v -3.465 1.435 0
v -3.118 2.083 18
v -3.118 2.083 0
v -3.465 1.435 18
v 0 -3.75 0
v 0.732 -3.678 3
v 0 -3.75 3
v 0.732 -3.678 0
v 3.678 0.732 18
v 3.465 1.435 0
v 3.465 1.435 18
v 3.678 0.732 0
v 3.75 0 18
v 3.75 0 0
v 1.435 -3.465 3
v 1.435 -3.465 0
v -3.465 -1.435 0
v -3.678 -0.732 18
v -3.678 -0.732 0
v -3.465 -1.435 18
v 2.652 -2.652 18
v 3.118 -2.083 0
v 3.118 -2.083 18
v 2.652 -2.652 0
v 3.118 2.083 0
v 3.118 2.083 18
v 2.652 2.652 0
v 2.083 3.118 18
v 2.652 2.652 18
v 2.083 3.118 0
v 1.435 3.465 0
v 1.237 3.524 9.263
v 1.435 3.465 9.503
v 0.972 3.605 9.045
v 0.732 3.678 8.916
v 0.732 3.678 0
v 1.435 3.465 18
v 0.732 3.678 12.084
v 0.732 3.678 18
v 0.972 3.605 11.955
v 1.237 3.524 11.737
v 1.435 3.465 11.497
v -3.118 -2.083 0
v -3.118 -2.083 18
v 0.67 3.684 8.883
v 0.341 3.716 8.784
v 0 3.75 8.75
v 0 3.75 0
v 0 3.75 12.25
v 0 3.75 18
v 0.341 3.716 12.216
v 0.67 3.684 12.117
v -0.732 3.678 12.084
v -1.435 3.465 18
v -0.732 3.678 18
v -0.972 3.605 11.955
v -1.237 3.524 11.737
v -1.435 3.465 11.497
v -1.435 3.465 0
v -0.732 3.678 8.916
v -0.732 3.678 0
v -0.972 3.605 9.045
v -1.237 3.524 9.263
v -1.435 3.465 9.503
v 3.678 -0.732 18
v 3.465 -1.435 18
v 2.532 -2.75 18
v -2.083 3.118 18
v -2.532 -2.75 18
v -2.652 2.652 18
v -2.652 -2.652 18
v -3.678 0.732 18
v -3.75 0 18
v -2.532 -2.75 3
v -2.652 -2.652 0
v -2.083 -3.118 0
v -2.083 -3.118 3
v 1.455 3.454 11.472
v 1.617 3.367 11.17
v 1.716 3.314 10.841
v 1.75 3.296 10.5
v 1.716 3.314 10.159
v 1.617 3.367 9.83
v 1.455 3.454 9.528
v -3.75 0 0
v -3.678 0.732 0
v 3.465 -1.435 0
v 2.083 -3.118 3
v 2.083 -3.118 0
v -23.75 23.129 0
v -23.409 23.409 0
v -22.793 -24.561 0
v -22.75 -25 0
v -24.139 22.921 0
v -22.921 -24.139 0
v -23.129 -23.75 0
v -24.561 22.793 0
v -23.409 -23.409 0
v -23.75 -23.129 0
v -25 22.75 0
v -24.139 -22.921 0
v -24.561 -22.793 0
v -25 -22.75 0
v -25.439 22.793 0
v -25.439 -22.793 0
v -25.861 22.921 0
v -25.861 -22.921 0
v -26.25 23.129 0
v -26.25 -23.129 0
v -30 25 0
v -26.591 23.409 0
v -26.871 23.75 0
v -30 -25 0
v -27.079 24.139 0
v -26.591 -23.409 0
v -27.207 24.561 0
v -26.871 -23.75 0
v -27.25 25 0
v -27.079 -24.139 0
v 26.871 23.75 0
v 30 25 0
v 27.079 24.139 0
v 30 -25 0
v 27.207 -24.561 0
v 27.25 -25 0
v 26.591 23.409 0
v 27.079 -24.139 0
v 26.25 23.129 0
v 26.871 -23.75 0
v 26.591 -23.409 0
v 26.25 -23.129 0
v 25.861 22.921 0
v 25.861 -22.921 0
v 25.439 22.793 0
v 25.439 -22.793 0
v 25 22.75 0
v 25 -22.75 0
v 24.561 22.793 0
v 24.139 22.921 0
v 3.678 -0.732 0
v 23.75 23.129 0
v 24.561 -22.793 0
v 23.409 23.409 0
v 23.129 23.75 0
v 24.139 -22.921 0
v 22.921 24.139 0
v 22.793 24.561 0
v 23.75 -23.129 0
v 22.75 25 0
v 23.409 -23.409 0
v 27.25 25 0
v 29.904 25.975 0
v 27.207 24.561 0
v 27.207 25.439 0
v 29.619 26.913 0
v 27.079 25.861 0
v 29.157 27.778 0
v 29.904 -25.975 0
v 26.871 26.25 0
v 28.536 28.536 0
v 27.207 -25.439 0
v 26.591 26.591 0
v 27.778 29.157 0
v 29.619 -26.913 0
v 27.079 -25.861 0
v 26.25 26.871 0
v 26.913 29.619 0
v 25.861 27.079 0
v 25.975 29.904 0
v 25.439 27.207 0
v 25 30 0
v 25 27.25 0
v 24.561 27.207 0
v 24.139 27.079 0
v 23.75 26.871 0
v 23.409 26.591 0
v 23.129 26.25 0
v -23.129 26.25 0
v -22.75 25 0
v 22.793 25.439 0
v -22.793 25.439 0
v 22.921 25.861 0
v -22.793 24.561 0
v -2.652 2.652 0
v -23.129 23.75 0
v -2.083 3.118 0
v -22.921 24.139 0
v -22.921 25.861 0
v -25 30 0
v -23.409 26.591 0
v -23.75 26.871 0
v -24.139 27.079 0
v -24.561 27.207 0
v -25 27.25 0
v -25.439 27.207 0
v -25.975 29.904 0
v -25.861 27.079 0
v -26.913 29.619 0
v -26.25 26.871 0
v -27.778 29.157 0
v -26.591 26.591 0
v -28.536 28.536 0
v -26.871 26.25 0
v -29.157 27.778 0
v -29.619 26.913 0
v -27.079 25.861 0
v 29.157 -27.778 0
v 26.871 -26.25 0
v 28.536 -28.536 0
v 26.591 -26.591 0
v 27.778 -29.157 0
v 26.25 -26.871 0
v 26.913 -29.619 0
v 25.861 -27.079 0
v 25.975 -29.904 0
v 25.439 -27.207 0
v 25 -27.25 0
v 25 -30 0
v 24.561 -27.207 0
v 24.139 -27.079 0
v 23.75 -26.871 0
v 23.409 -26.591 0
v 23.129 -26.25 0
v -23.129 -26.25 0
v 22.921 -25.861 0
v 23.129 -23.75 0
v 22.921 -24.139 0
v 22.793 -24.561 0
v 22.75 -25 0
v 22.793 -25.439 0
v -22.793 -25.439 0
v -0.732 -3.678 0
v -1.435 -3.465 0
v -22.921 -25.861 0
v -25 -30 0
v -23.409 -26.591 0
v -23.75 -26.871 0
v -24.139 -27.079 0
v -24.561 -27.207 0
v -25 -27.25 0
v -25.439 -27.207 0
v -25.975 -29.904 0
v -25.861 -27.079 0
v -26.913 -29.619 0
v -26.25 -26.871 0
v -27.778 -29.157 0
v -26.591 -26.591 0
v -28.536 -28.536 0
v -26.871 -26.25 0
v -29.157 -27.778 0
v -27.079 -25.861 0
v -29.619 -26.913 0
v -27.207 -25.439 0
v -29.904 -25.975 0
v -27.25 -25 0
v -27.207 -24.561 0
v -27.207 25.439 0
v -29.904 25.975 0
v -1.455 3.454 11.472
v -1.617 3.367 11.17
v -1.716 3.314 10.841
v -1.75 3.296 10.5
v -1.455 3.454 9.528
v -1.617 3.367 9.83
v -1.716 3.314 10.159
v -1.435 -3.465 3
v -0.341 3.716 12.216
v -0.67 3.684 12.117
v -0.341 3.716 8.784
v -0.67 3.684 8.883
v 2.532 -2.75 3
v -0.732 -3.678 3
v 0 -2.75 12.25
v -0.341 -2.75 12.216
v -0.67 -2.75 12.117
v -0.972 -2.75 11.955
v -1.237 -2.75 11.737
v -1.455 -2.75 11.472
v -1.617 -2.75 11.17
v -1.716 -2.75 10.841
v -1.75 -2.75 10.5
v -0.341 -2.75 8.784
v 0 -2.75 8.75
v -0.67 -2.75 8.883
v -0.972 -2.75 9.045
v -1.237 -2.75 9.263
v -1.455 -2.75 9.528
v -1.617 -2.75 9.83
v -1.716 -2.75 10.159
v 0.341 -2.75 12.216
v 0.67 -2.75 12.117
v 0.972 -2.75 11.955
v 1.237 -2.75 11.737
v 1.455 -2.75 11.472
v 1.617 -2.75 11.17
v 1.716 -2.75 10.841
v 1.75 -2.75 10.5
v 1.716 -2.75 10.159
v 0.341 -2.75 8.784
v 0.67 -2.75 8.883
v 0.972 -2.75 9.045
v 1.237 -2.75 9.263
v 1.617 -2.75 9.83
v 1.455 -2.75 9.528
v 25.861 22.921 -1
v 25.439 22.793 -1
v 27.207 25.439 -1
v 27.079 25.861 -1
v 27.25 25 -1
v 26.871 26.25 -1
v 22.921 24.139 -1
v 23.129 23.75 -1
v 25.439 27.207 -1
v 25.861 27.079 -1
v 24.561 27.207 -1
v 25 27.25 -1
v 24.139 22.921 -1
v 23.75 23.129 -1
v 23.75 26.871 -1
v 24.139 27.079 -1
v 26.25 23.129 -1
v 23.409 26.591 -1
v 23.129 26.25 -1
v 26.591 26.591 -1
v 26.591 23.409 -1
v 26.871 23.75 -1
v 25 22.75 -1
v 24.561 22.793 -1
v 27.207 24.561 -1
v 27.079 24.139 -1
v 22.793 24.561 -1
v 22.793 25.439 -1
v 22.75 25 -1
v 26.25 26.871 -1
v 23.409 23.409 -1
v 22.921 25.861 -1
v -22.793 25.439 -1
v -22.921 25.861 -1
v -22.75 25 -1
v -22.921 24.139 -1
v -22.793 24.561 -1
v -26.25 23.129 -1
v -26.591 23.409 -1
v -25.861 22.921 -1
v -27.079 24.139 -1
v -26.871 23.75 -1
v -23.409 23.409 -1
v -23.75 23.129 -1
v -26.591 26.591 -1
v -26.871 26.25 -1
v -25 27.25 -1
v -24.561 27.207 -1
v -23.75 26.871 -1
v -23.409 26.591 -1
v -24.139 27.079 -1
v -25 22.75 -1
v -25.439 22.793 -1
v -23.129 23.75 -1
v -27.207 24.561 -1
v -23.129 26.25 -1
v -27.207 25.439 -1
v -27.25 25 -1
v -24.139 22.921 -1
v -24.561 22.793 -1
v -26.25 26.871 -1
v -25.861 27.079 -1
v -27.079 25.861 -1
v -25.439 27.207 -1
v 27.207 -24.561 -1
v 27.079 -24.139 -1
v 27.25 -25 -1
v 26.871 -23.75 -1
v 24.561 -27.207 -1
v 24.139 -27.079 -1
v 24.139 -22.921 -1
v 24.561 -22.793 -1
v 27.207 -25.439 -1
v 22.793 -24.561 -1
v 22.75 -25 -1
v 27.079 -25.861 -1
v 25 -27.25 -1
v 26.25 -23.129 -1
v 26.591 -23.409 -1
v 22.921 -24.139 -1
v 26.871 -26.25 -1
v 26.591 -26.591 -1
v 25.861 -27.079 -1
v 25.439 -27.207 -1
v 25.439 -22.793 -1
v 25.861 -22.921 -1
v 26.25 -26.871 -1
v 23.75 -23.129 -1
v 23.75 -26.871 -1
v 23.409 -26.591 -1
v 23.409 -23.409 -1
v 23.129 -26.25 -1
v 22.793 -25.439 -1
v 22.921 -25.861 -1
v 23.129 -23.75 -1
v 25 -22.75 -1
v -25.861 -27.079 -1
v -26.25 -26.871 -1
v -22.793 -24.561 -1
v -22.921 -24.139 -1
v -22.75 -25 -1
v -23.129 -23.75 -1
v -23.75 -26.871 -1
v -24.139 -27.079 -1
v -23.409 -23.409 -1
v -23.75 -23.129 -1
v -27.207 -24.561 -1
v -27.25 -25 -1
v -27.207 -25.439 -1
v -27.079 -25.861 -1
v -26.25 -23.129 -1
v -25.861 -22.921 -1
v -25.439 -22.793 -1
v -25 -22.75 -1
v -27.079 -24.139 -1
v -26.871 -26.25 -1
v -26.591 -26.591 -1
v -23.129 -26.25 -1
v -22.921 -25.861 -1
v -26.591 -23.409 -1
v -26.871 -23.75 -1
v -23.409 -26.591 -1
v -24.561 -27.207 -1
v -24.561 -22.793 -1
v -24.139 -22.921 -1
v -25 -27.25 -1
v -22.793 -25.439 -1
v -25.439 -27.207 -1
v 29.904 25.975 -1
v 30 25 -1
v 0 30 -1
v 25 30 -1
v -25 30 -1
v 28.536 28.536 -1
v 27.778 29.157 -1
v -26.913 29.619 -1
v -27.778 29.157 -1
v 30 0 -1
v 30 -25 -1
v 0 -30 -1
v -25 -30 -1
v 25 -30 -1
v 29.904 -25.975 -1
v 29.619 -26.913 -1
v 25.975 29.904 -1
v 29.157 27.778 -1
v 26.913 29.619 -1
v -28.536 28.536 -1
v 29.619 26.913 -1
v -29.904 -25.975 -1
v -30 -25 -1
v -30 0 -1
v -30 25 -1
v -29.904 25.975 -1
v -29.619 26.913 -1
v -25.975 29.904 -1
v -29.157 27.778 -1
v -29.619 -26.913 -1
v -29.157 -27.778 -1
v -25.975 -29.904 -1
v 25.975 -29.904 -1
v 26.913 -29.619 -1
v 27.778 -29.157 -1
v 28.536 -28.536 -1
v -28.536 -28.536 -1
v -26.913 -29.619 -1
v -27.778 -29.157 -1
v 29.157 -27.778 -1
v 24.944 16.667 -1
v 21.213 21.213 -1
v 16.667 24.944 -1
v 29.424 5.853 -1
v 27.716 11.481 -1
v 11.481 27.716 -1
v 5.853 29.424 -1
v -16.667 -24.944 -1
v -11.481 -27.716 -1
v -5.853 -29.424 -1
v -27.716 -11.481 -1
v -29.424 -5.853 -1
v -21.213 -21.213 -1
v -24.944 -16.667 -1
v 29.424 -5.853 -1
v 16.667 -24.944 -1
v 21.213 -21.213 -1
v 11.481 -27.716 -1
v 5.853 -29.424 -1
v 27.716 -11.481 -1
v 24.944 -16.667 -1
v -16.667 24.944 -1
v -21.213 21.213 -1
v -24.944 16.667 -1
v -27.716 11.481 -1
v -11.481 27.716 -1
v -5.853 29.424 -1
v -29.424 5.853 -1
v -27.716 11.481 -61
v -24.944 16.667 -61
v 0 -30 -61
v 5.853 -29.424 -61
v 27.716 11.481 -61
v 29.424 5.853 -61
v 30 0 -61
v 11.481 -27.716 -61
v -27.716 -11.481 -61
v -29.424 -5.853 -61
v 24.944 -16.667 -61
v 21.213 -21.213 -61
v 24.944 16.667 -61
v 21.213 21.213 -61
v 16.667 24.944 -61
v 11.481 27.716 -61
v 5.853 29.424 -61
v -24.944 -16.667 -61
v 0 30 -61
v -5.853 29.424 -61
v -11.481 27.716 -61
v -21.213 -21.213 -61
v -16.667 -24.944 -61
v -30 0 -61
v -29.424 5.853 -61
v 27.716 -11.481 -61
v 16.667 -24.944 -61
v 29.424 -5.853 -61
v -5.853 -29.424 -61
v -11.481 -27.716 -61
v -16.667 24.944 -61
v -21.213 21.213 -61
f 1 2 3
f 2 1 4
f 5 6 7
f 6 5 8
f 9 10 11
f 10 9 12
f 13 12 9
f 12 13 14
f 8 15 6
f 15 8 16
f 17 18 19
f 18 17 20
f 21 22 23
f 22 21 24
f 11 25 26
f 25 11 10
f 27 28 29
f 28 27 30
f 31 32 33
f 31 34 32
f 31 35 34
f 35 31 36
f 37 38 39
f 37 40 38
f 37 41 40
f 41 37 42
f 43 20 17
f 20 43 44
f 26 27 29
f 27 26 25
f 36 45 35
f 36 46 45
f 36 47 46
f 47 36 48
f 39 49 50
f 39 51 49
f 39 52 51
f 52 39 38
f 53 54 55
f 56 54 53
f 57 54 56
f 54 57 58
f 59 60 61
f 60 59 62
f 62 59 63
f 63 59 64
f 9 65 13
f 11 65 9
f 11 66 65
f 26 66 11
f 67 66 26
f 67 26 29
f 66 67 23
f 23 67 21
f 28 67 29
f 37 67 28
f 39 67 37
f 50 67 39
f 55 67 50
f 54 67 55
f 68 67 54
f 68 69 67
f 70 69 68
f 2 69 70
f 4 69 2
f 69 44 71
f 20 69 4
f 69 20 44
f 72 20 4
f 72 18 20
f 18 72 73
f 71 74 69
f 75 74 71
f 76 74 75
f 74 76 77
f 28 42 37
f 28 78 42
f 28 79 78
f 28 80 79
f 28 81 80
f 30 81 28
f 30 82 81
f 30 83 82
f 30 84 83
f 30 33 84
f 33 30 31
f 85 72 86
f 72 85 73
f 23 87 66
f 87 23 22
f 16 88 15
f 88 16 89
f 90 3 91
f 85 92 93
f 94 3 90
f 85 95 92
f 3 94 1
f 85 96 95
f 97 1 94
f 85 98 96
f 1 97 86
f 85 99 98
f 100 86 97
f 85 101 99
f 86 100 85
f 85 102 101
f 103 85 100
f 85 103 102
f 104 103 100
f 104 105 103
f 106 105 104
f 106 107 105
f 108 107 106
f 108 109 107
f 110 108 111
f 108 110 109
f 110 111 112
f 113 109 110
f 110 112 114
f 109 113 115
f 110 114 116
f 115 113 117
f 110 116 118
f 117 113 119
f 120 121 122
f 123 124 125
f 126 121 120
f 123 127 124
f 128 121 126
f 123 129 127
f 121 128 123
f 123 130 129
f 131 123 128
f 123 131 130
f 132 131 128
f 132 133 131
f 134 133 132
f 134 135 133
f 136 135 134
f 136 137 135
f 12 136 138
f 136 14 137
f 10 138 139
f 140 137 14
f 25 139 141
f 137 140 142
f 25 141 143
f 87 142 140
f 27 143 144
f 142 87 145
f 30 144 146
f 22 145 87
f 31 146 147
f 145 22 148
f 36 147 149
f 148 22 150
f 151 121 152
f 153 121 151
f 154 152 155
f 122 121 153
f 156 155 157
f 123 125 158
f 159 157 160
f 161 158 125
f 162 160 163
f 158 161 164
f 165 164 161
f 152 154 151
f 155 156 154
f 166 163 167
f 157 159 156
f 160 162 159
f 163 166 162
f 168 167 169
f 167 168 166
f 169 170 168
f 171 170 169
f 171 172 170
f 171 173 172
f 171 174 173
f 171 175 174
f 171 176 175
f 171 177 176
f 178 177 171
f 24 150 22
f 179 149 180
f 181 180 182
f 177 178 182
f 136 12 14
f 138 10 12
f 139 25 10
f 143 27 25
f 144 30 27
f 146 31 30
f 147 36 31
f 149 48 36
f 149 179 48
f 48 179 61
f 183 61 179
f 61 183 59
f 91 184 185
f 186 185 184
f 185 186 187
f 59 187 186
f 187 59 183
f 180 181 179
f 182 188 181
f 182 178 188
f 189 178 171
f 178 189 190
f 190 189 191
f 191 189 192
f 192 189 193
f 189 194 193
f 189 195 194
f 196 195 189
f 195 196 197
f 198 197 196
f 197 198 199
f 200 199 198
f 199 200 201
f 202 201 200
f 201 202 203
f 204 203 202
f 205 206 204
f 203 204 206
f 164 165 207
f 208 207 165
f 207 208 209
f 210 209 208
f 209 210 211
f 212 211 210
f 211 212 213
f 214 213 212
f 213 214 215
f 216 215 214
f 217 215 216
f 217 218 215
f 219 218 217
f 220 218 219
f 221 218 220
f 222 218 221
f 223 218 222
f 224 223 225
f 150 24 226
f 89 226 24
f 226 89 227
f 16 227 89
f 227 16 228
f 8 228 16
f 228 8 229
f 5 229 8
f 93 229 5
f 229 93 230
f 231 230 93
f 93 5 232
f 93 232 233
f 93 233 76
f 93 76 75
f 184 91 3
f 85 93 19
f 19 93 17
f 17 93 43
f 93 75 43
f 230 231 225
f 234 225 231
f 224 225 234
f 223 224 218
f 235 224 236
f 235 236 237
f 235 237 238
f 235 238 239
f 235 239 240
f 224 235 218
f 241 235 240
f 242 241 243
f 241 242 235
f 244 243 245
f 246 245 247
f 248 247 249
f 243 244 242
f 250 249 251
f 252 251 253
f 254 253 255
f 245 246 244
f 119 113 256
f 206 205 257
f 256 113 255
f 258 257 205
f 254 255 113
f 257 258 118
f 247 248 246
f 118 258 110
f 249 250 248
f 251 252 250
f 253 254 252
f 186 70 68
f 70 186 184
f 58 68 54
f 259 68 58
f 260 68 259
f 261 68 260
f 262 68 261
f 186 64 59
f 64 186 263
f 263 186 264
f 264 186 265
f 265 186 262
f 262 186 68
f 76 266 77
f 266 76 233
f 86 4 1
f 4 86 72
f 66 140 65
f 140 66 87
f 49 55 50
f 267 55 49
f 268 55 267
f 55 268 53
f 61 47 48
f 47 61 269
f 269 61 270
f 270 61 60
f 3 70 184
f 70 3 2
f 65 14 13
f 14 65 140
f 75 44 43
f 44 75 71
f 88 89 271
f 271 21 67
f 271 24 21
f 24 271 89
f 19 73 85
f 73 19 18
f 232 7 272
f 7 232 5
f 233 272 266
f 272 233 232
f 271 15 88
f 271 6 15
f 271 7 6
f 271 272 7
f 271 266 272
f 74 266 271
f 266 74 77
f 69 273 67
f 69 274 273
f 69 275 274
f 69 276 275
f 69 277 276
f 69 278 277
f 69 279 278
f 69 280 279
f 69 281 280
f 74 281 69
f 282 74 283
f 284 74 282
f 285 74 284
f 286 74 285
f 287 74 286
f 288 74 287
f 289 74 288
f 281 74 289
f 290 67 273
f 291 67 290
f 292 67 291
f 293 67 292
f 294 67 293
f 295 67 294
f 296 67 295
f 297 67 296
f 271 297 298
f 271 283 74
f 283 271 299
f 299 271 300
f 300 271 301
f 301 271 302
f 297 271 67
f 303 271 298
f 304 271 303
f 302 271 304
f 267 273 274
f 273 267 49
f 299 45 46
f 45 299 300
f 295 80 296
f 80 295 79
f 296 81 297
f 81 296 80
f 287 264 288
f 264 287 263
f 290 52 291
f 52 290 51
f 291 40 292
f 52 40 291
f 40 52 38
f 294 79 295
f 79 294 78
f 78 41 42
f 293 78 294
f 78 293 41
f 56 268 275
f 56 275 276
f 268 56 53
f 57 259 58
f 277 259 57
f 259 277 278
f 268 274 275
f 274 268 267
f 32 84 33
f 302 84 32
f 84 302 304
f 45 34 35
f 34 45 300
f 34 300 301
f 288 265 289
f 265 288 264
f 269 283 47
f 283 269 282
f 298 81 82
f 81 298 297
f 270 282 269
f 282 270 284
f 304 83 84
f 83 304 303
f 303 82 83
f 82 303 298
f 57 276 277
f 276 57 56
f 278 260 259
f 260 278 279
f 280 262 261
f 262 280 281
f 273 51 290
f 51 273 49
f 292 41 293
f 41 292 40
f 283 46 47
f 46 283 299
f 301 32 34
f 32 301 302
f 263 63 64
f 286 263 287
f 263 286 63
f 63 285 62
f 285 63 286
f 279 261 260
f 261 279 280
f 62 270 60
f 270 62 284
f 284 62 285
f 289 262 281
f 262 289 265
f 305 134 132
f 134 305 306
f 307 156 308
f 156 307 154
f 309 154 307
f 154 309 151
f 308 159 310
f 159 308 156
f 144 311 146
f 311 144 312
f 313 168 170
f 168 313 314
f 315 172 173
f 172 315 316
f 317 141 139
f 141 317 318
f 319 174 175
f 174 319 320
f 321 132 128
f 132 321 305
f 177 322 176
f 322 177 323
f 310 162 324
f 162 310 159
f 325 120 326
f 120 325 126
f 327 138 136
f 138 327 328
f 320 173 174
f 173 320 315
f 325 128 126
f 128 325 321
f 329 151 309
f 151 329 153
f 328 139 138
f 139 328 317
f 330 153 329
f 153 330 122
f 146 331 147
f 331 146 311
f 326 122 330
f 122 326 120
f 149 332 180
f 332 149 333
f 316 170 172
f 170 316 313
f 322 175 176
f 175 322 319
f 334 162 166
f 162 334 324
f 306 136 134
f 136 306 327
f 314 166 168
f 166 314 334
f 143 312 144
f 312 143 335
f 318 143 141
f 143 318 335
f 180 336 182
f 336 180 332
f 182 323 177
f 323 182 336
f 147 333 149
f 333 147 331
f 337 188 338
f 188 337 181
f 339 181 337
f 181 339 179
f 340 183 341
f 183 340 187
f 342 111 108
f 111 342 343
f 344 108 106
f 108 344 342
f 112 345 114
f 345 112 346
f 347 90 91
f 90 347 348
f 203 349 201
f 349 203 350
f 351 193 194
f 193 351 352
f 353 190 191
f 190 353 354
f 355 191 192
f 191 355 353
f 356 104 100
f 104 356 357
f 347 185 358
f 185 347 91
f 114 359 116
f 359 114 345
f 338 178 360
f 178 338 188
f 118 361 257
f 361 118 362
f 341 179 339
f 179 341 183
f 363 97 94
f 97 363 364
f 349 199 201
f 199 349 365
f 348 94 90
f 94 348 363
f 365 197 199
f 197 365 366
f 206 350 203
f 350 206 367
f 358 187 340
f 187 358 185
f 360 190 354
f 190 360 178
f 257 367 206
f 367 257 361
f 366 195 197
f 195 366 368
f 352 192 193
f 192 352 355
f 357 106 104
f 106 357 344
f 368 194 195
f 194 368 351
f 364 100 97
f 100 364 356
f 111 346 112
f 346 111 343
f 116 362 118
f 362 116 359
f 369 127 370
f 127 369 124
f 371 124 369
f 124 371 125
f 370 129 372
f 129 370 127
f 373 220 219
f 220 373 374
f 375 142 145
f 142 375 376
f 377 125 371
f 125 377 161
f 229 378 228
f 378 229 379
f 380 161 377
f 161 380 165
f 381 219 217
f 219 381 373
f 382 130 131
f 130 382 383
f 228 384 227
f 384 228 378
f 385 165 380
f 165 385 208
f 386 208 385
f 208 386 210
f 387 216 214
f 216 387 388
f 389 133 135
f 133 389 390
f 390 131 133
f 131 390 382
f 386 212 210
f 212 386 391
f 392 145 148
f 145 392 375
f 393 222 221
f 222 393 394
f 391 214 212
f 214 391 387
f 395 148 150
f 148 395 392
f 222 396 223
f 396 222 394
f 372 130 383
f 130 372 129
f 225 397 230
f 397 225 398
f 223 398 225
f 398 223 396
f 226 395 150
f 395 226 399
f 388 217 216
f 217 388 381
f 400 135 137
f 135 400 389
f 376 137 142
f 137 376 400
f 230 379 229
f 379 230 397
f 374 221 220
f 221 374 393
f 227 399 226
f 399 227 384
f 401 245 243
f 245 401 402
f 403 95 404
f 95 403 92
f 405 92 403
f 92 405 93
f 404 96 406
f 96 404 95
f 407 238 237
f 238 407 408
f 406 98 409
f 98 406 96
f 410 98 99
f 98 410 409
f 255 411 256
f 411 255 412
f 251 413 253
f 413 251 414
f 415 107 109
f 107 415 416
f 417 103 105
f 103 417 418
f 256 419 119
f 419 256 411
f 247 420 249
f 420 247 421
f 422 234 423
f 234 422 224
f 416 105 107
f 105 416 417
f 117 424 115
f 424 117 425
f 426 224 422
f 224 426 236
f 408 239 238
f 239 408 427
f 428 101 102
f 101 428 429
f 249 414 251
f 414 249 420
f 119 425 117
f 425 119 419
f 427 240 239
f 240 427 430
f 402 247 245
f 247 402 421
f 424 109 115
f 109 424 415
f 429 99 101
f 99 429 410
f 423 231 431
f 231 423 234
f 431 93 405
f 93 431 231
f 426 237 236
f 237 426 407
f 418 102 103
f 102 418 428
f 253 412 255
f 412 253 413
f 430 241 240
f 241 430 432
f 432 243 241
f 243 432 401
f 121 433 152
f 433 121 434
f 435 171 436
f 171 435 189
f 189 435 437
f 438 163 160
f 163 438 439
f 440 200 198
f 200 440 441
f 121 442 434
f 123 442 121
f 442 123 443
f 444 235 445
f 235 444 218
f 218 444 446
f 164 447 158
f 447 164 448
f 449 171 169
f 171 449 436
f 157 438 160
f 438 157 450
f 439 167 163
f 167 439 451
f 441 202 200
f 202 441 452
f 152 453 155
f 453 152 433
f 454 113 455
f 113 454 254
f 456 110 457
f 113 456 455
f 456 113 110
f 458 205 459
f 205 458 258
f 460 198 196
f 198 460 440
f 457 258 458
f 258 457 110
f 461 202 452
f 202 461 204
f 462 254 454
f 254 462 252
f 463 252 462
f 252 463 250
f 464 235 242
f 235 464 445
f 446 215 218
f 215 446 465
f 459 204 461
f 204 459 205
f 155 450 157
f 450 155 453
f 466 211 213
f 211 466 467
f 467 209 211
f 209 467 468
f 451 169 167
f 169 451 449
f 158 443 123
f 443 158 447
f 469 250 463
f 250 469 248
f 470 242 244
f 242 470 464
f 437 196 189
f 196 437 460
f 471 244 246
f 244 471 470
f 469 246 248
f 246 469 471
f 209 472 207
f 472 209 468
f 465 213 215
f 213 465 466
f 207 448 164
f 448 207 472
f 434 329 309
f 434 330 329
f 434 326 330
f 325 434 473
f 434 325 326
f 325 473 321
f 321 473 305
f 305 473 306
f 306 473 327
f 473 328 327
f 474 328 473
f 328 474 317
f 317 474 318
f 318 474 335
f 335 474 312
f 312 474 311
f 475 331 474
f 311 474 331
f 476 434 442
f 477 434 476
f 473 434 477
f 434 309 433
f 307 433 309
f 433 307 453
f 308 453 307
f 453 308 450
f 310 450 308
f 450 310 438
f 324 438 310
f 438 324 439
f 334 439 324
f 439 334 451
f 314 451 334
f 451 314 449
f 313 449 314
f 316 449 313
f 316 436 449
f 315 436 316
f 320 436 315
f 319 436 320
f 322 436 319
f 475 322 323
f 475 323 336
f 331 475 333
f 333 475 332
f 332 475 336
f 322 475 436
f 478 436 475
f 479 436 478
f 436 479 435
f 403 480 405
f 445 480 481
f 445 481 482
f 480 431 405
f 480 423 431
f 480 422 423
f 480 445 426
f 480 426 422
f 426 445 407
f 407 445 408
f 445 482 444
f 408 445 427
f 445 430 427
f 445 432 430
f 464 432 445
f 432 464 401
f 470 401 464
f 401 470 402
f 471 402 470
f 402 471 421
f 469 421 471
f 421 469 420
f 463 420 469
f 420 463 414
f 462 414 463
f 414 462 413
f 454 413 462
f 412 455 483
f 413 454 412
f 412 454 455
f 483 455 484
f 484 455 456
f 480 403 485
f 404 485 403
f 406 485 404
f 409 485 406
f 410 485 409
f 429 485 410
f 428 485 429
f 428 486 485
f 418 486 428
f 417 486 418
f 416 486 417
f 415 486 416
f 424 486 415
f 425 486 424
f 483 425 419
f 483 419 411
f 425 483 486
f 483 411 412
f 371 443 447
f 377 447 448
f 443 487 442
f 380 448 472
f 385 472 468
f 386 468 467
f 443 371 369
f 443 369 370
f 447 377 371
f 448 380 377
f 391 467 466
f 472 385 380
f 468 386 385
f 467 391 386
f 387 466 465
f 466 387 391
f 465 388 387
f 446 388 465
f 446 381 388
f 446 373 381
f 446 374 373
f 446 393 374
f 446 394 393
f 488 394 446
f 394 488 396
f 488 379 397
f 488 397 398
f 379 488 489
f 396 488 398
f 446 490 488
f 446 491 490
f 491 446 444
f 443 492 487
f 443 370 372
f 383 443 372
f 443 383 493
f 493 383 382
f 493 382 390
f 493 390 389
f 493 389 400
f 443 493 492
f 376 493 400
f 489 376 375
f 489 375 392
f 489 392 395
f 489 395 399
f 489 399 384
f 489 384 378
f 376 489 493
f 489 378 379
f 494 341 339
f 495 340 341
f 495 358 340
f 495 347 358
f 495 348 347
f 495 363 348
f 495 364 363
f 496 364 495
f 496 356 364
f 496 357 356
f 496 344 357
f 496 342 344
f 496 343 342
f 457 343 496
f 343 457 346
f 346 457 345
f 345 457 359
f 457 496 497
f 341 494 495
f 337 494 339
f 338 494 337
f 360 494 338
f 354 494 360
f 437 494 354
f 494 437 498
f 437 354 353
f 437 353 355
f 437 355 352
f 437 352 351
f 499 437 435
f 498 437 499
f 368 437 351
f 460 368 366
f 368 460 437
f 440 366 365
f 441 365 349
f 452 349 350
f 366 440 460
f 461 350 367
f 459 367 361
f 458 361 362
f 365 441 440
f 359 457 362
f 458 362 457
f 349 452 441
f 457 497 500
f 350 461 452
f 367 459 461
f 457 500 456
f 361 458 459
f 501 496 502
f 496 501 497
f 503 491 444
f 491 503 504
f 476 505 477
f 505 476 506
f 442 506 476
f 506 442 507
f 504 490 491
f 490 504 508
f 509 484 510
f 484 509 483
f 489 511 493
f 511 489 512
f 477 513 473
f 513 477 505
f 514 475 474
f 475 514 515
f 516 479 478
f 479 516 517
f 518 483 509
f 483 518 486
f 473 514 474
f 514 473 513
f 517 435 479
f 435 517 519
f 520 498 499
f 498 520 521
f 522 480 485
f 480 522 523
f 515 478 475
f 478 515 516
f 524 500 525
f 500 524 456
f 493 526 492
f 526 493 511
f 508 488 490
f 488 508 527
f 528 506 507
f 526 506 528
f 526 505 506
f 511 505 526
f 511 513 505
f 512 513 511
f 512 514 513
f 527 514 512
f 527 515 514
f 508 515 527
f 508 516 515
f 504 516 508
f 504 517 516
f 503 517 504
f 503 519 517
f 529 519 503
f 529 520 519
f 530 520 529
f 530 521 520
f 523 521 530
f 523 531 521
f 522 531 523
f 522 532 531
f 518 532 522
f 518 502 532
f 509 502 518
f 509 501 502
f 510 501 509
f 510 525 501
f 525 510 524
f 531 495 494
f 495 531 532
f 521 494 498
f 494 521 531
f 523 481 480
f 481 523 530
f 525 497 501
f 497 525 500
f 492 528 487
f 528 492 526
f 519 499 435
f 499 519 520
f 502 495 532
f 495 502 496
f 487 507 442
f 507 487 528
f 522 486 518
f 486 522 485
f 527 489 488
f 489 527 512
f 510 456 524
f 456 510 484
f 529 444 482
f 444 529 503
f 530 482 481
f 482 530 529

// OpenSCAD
$fn=32;

er=5;
hr=2.25;
w=60;
hd=50;

liftMotor();

module liftMotorHoles(h) {
  translate([hd/2,hd/2,0]) cylinder(r=hr,h=h);
  translate([-hd/2,hd/2,0]) cylinder(r=hr,h=h);
  translate([hd/2,-hd/2,0]) cylinder(r=hr,h=h);
  translate([-hd/2,-hd/2,0]) cylinder(r=hr,h=h);
}

module liftMotor(r=0) {
  color("silver") rotate([0,0,r]) peg();
  translate([0,0,-61]) color("gray") cylinder(r=30,h=60);
  color("gray") difference() {
    hull() {
      translate([w/2-er,w/2-er,-1]) cylinder(r=er,h=1);
      translate([-w/2+er,w/2-er,-1]) cylinder(r=er,h=1);
      translate([w/2-er,-w/2+er,-1]) cylinder(r=er,h=1);
      translate([-w/2+er,-w/2+er,-1]) cylinder(r=er,h=1);
    }
    translate([0,0,-1.1]) liftMotorHoles(1.2);
  }
}

module peg() {
  difference() {
    difference() {
      cylinder(r=3.75,h=18);
      translate([-50,-100-2.75,3]) cube([100,100,15.1]);
    }
    translate([0,50,10.5]) rotate([90,0,0]) cylinder(r=1.75,h=100);
  }
}
